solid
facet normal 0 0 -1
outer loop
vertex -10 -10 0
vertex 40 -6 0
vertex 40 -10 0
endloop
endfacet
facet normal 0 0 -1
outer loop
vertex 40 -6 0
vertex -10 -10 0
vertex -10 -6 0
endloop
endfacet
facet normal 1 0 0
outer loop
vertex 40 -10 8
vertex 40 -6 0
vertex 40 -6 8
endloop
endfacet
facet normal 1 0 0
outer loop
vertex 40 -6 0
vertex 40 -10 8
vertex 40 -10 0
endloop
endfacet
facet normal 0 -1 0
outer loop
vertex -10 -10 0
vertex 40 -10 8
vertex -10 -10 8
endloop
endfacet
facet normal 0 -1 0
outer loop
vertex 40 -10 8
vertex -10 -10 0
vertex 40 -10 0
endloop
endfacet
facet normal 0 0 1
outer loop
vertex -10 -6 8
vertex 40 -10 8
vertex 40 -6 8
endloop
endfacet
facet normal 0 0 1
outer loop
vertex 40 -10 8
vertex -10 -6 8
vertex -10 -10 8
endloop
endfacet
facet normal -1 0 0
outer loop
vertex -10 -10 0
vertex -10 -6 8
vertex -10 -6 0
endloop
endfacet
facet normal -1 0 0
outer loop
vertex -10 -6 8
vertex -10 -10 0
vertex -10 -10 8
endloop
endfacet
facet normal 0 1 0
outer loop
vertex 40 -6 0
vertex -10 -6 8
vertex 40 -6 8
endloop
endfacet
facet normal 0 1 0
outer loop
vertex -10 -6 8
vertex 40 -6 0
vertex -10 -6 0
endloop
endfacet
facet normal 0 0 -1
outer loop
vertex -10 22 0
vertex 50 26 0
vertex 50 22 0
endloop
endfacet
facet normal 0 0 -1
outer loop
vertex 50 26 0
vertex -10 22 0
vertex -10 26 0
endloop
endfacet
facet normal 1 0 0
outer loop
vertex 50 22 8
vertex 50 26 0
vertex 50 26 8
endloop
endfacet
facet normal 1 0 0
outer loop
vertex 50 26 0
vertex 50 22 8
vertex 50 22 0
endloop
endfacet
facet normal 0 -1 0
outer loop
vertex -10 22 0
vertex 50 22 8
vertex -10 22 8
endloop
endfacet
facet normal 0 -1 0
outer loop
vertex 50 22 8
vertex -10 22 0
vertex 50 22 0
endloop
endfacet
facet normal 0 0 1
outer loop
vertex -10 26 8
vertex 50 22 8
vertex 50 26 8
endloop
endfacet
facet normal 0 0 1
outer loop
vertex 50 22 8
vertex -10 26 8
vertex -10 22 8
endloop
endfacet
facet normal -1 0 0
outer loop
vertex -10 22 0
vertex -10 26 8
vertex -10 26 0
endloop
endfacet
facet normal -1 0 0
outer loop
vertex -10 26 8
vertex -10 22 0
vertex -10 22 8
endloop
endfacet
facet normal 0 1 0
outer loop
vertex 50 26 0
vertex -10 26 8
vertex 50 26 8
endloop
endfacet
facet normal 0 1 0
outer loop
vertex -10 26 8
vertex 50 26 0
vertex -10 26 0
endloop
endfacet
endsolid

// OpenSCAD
// Built by bench/smallmodels/features/compiler.py from a list of features.
$fn = 64;
union() {
    translate([-10, -10, 0]) linear_extrude(height = 8) polygon([[0, 0], [50, 0], [50, 4], [0, 4]]);
    translate([-10, 10, 0]) linear_extrude(height = 8) polygon([[0, 12], [60, 12], [60, 16], [0, 16]]);
  }
